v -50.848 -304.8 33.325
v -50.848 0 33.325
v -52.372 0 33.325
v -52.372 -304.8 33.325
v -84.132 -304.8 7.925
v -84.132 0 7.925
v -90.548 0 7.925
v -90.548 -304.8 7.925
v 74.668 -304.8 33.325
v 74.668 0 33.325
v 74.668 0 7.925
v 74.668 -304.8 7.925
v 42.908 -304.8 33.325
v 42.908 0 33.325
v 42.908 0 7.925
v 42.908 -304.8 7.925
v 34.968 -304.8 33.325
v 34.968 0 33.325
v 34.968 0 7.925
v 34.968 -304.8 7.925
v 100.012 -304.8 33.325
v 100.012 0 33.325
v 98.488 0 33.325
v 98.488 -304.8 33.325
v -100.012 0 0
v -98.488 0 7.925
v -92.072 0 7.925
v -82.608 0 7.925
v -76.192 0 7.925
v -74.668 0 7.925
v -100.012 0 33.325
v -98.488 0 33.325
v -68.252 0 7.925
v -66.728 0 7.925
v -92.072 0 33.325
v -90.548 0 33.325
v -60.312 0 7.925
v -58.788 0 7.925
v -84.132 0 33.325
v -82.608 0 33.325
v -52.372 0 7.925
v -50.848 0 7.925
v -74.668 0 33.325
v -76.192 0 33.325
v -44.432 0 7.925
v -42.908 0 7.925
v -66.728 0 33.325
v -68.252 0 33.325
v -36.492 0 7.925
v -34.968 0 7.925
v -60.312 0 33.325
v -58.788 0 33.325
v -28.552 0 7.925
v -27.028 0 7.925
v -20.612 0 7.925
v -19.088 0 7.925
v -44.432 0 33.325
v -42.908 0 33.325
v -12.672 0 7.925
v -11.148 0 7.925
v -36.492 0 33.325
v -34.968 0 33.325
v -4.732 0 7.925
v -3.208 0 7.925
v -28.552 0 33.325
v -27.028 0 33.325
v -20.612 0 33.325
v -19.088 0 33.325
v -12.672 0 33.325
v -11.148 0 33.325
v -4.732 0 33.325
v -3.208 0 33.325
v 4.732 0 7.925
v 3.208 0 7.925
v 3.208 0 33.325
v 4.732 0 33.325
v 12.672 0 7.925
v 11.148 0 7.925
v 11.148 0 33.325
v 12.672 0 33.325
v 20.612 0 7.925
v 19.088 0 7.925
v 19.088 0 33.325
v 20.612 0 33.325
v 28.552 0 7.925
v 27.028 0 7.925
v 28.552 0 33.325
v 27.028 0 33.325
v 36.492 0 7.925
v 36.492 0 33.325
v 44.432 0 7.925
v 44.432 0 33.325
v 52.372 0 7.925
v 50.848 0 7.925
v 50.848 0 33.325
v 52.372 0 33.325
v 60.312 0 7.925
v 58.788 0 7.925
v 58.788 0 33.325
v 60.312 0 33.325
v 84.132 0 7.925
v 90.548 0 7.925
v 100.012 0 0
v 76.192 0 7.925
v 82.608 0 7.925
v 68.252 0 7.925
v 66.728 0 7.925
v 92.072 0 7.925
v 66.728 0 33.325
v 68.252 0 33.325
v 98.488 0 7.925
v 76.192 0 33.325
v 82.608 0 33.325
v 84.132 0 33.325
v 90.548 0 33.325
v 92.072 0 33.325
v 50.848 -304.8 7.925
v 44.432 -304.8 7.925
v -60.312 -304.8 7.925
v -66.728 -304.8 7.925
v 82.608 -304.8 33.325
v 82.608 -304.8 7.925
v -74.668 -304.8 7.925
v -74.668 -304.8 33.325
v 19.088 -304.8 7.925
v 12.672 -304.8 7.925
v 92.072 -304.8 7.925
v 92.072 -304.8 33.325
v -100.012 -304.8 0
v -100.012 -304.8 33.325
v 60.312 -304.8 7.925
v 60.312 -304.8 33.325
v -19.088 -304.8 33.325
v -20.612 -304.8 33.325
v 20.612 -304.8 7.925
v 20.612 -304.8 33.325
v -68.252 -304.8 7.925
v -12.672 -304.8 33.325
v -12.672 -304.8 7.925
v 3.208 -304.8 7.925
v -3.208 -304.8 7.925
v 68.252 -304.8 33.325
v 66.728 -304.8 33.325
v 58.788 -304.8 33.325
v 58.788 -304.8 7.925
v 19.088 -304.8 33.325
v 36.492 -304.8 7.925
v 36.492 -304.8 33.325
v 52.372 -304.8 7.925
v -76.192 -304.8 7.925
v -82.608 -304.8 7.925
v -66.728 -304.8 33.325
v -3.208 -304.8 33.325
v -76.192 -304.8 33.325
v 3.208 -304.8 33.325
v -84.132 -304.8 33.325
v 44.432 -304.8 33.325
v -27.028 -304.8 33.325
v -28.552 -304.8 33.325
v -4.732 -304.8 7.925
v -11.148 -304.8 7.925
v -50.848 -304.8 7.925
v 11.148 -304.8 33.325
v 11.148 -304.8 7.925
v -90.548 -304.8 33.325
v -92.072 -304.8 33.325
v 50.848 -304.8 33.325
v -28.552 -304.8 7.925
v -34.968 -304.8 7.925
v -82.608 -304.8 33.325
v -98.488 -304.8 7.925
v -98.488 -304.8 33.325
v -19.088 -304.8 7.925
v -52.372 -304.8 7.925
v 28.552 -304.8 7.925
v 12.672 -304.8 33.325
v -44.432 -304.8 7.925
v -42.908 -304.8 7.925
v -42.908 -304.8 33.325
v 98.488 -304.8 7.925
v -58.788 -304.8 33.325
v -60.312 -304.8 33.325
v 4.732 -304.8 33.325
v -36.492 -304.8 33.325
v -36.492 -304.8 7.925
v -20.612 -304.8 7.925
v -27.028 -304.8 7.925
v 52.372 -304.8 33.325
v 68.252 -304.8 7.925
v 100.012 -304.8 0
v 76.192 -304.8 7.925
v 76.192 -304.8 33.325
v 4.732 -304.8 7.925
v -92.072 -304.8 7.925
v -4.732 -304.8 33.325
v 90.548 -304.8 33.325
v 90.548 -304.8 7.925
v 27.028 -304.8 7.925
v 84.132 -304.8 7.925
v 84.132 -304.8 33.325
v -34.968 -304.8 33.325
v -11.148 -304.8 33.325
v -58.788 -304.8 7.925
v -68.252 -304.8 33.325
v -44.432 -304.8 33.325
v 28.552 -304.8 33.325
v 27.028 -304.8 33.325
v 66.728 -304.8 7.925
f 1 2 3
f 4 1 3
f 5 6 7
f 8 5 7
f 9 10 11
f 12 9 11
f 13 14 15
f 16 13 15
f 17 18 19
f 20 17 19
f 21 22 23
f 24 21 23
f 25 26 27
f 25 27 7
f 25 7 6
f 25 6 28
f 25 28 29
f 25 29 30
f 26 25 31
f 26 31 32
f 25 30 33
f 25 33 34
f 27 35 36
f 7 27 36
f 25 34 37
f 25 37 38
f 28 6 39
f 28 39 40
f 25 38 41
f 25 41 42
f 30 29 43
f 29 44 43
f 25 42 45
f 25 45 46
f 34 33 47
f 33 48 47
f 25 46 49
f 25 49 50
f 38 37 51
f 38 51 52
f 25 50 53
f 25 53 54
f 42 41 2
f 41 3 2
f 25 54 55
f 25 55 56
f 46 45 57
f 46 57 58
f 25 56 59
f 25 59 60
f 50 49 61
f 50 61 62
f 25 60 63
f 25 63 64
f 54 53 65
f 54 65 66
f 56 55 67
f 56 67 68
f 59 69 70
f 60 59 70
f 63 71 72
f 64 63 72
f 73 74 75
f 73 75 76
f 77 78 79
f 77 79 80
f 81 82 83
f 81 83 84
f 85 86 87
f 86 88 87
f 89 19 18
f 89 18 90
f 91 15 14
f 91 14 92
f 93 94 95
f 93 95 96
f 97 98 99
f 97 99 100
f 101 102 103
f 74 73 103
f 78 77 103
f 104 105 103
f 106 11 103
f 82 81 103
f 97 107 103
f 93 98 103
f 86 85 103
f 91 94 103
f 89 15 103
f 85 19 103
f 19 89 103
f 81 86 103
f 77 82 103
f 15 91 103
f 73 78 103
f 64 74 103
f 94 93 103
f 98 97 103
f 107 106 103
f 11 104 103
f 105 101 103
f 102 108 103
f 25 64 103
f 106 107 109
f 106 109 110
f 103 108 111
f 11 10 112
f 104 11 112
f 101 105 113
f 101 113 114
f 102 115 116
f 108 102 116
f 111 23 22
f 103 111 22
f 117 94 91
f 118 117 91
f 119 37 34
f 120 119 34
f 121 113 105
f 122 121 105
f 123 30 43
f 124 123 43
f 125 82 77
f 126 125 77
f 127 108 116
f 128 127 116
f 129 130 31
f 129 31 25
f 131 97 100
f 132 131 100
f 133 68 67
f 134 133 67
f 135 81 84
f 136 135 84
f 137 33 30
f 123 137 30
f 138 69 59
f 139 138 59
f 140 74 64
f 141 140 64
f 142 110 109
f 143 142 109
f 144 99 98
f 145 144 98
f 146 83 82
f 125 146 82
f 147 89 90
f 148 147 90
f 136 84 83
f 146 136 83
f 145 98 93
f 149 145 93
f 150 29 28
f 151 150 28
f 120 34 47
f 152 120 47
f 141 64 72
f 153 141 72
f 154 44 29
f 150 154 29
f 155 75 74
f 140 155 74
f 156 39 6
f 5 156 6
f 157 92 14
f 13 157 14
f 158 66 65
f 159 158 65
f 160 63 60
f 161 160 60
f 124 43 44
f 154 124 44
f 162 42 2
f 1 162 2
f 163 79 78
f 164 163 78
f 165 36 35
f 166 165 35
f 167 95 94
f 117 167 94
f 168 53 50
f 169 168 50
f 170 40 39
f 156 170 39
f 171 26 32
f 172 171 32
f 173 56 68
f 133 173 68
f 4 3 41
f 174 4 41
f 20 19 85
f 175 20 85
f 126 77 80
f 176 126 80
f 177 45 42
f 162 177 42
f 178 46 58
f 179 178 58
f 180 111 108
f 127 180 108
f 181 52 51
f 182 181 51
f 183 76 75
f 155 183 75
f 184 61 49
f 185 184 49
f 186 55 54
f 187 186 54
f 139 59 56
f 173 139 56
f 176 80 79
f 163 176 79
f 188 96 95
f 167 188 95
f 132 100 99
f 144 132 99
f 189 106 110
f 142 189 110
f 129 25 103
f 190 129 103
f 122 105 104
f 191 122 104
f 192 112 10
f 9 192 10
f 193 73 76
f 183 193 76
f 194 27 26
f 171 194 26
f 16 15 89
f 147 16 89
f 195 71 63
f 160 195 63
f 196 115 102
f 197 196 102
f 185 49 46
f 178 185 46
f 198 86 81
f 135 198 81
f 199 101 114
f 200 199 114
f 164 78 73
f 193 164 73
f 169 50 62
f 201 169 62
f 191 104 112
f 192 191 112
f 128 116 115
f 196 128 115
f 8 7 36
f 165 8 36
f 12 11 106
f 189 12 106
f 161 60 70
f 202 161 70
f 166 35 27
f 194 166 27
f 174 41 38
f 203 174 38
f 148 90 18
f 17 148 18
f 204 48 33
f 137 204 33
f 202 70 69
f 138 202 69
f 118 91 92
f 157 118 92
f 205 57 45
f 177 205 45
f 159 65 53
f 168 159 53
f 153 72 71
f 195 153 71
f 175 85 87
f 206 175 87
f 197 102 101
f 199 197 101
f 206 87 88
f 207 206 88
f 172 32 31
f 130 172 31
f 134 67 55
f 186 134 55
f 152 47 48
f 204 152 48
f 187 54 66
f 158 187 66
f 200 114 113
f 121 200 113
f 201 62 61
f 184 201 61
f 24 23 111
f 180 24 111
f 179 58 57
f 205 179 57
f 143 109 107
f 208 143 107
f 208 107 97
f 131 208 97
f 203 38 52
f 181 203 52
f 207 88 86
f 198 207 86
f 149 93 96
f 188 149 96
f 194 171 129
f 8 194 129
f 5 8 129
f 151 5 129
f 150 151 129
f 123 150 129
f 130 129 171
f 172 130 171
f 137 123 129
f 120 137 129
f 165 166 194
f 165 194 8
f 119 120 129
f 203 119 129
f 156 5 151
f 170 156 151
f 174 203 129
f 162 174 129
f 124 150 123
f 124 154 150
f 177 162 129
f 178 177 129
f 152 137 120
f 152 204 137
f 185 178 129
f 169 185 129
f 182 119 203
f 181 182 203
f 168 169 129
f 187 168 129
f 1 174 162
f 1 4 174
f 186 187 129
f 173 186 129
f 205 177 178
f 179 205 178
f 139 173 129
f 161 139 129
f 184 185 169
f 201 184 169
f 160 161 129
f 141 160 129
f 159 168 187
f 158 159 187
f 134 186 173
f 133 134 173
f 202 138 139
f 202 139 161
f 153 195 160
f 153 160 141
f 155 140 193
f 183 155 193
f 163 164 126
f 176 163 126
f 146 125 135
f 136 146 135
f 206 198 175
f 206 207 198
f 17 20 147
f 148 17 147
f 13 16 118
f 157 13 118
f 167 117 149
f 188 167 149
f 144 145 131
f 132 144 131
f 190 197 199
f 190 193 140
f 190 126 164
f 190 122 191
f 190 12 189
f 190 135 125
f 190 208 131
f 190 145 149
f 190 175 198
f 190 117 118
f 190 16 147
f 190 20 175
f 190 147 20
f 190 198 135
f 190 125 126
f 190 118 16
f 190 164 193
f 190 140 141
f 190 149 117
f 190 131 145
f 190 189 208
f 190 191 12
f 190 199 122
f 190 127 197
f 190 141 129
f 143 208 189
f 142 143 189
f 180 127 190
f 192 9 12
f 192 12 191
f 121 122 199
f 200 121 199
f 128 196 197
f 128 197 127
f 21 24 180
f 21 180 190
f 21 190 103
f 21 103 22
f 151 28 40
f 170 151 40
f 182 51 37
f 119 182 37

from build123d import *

# Parameters (mm, degrees)
F1_DEPTH = 304.8


with BuildPart() as f1:
    # F0 (on Front) → F1 (new body)
    with BuildSketch(Plane.XZ):
        Polygon((-100.0125, 33.3248), (-100.0125, 0), (100.0125, 0), (100.0125, 33.3248), (98.4885, 33.3248), (98.4885, 7.9248), (92.07246, 7.9248), (92.07246, 33.3248), (90.54846, 33.3248), (90.54846, 7.9248), (84.13242, 7.9248), (84.13242, 33.3248), (82.60842, 33.3248), (82.60842, 7.9248), (76.19238, 7.9248), (76.19238, 33.3248), (74.66838, 33.3248), (74.66838, 7.9248), (68.25234, 7.9248), (68.25234, 33.3248), (66.72834, 33.3248), (66.72834, 7.9248), (60.3123, 7.9248), (60.3123, 33.3248), (58.7883, 33.3248), (58.7883, 7.9248), (52.37226, 7.9248), (52.37226, 33.3248), (50.84826, 33.3248), (50.84826, 7.9248), (44.43222, 7.9248), (44.43222, 33.3248), (42.90822, 33.3248), (42.90822, 7.9248), (36.49218, 7.9248), (36.49218, 33.3248), (34.96818, 33.3248), (34.96818, 7.9248), (28.55214, 7.9248), (28.55214, 33.3248), (27.02814, 33.3248), (27.02814, 7.9248), (20.6121, 7.9248), (20.6121, 33.3248), (19.0881, 33.3248), (19.0881, 7.9248), (12.67206, 7.9248), (12.67206, 33.3248), (11.14806, 33.3248), (11.14806, 7.9248), (4.73202, 7.9248), (4.73202, 33.3248), (3.20802, 33.3248), (3.20802, 7.9248), (-3.20802, 7.9248), (-3.20802, 33.3248), (-4.73202, 33.3248), (-4.73202, 7.9248), (-11.14806, 7.9248), (-11.14806, 33.3248), (-12.67206, 33.3248), (-12.67206, 7.9248), (-19.0881, 7.9248), (-19.0881, 33.3248), (-20.6121, 33.3248), (-20.6121, 7.9248), (-27.02814, 7.9248), (-27.02814, 33.3248), (-28.55214, 33.3248), (-28.55214, 7.9248), (-34.96818, 7.9248), (-34.96818, 33.3248), (-36.49218, 33.3248), (-36.49218, 7.9248), (-42.90822, 7.9248), (-42.90822, 33.3248), (-44.43222, 33.3248), (-44.43222, 7.9248), (-50.84826, 7.9248), (-50.84826, 33.3248), (-52.37226, 33.3248), (-52.37226, 7.9248), (-58.7883, 7.9248), (-58.7883, 33.3248), (-60.3123, 33.3248), (-60.3123, 7.9248), (-66.72834, 7.9248), (-66.72834, 33.3248), (-68.25234, 33.3248), (-68.25234, 7.9248), (-74.66838, 7.9248), (-74.66838, 33.3248), (-76.19238, 33.3248), (-76.19238, 7.9248), (-82.60842, 7.9248), (-82.60842, 33.3248), (-84.13242, 33.3248), (-84.13242, 7.9248), (-90.54846, 7.9248), (-90.54846, 33.3248), (-92.07246, 33.3248), (-92.07246, 7.9248), (-98.4885, 7.9248), (-98.4885, 33.3248), align=None)
    extrude(amount=F1_DEPTH)


solid = f1.part
